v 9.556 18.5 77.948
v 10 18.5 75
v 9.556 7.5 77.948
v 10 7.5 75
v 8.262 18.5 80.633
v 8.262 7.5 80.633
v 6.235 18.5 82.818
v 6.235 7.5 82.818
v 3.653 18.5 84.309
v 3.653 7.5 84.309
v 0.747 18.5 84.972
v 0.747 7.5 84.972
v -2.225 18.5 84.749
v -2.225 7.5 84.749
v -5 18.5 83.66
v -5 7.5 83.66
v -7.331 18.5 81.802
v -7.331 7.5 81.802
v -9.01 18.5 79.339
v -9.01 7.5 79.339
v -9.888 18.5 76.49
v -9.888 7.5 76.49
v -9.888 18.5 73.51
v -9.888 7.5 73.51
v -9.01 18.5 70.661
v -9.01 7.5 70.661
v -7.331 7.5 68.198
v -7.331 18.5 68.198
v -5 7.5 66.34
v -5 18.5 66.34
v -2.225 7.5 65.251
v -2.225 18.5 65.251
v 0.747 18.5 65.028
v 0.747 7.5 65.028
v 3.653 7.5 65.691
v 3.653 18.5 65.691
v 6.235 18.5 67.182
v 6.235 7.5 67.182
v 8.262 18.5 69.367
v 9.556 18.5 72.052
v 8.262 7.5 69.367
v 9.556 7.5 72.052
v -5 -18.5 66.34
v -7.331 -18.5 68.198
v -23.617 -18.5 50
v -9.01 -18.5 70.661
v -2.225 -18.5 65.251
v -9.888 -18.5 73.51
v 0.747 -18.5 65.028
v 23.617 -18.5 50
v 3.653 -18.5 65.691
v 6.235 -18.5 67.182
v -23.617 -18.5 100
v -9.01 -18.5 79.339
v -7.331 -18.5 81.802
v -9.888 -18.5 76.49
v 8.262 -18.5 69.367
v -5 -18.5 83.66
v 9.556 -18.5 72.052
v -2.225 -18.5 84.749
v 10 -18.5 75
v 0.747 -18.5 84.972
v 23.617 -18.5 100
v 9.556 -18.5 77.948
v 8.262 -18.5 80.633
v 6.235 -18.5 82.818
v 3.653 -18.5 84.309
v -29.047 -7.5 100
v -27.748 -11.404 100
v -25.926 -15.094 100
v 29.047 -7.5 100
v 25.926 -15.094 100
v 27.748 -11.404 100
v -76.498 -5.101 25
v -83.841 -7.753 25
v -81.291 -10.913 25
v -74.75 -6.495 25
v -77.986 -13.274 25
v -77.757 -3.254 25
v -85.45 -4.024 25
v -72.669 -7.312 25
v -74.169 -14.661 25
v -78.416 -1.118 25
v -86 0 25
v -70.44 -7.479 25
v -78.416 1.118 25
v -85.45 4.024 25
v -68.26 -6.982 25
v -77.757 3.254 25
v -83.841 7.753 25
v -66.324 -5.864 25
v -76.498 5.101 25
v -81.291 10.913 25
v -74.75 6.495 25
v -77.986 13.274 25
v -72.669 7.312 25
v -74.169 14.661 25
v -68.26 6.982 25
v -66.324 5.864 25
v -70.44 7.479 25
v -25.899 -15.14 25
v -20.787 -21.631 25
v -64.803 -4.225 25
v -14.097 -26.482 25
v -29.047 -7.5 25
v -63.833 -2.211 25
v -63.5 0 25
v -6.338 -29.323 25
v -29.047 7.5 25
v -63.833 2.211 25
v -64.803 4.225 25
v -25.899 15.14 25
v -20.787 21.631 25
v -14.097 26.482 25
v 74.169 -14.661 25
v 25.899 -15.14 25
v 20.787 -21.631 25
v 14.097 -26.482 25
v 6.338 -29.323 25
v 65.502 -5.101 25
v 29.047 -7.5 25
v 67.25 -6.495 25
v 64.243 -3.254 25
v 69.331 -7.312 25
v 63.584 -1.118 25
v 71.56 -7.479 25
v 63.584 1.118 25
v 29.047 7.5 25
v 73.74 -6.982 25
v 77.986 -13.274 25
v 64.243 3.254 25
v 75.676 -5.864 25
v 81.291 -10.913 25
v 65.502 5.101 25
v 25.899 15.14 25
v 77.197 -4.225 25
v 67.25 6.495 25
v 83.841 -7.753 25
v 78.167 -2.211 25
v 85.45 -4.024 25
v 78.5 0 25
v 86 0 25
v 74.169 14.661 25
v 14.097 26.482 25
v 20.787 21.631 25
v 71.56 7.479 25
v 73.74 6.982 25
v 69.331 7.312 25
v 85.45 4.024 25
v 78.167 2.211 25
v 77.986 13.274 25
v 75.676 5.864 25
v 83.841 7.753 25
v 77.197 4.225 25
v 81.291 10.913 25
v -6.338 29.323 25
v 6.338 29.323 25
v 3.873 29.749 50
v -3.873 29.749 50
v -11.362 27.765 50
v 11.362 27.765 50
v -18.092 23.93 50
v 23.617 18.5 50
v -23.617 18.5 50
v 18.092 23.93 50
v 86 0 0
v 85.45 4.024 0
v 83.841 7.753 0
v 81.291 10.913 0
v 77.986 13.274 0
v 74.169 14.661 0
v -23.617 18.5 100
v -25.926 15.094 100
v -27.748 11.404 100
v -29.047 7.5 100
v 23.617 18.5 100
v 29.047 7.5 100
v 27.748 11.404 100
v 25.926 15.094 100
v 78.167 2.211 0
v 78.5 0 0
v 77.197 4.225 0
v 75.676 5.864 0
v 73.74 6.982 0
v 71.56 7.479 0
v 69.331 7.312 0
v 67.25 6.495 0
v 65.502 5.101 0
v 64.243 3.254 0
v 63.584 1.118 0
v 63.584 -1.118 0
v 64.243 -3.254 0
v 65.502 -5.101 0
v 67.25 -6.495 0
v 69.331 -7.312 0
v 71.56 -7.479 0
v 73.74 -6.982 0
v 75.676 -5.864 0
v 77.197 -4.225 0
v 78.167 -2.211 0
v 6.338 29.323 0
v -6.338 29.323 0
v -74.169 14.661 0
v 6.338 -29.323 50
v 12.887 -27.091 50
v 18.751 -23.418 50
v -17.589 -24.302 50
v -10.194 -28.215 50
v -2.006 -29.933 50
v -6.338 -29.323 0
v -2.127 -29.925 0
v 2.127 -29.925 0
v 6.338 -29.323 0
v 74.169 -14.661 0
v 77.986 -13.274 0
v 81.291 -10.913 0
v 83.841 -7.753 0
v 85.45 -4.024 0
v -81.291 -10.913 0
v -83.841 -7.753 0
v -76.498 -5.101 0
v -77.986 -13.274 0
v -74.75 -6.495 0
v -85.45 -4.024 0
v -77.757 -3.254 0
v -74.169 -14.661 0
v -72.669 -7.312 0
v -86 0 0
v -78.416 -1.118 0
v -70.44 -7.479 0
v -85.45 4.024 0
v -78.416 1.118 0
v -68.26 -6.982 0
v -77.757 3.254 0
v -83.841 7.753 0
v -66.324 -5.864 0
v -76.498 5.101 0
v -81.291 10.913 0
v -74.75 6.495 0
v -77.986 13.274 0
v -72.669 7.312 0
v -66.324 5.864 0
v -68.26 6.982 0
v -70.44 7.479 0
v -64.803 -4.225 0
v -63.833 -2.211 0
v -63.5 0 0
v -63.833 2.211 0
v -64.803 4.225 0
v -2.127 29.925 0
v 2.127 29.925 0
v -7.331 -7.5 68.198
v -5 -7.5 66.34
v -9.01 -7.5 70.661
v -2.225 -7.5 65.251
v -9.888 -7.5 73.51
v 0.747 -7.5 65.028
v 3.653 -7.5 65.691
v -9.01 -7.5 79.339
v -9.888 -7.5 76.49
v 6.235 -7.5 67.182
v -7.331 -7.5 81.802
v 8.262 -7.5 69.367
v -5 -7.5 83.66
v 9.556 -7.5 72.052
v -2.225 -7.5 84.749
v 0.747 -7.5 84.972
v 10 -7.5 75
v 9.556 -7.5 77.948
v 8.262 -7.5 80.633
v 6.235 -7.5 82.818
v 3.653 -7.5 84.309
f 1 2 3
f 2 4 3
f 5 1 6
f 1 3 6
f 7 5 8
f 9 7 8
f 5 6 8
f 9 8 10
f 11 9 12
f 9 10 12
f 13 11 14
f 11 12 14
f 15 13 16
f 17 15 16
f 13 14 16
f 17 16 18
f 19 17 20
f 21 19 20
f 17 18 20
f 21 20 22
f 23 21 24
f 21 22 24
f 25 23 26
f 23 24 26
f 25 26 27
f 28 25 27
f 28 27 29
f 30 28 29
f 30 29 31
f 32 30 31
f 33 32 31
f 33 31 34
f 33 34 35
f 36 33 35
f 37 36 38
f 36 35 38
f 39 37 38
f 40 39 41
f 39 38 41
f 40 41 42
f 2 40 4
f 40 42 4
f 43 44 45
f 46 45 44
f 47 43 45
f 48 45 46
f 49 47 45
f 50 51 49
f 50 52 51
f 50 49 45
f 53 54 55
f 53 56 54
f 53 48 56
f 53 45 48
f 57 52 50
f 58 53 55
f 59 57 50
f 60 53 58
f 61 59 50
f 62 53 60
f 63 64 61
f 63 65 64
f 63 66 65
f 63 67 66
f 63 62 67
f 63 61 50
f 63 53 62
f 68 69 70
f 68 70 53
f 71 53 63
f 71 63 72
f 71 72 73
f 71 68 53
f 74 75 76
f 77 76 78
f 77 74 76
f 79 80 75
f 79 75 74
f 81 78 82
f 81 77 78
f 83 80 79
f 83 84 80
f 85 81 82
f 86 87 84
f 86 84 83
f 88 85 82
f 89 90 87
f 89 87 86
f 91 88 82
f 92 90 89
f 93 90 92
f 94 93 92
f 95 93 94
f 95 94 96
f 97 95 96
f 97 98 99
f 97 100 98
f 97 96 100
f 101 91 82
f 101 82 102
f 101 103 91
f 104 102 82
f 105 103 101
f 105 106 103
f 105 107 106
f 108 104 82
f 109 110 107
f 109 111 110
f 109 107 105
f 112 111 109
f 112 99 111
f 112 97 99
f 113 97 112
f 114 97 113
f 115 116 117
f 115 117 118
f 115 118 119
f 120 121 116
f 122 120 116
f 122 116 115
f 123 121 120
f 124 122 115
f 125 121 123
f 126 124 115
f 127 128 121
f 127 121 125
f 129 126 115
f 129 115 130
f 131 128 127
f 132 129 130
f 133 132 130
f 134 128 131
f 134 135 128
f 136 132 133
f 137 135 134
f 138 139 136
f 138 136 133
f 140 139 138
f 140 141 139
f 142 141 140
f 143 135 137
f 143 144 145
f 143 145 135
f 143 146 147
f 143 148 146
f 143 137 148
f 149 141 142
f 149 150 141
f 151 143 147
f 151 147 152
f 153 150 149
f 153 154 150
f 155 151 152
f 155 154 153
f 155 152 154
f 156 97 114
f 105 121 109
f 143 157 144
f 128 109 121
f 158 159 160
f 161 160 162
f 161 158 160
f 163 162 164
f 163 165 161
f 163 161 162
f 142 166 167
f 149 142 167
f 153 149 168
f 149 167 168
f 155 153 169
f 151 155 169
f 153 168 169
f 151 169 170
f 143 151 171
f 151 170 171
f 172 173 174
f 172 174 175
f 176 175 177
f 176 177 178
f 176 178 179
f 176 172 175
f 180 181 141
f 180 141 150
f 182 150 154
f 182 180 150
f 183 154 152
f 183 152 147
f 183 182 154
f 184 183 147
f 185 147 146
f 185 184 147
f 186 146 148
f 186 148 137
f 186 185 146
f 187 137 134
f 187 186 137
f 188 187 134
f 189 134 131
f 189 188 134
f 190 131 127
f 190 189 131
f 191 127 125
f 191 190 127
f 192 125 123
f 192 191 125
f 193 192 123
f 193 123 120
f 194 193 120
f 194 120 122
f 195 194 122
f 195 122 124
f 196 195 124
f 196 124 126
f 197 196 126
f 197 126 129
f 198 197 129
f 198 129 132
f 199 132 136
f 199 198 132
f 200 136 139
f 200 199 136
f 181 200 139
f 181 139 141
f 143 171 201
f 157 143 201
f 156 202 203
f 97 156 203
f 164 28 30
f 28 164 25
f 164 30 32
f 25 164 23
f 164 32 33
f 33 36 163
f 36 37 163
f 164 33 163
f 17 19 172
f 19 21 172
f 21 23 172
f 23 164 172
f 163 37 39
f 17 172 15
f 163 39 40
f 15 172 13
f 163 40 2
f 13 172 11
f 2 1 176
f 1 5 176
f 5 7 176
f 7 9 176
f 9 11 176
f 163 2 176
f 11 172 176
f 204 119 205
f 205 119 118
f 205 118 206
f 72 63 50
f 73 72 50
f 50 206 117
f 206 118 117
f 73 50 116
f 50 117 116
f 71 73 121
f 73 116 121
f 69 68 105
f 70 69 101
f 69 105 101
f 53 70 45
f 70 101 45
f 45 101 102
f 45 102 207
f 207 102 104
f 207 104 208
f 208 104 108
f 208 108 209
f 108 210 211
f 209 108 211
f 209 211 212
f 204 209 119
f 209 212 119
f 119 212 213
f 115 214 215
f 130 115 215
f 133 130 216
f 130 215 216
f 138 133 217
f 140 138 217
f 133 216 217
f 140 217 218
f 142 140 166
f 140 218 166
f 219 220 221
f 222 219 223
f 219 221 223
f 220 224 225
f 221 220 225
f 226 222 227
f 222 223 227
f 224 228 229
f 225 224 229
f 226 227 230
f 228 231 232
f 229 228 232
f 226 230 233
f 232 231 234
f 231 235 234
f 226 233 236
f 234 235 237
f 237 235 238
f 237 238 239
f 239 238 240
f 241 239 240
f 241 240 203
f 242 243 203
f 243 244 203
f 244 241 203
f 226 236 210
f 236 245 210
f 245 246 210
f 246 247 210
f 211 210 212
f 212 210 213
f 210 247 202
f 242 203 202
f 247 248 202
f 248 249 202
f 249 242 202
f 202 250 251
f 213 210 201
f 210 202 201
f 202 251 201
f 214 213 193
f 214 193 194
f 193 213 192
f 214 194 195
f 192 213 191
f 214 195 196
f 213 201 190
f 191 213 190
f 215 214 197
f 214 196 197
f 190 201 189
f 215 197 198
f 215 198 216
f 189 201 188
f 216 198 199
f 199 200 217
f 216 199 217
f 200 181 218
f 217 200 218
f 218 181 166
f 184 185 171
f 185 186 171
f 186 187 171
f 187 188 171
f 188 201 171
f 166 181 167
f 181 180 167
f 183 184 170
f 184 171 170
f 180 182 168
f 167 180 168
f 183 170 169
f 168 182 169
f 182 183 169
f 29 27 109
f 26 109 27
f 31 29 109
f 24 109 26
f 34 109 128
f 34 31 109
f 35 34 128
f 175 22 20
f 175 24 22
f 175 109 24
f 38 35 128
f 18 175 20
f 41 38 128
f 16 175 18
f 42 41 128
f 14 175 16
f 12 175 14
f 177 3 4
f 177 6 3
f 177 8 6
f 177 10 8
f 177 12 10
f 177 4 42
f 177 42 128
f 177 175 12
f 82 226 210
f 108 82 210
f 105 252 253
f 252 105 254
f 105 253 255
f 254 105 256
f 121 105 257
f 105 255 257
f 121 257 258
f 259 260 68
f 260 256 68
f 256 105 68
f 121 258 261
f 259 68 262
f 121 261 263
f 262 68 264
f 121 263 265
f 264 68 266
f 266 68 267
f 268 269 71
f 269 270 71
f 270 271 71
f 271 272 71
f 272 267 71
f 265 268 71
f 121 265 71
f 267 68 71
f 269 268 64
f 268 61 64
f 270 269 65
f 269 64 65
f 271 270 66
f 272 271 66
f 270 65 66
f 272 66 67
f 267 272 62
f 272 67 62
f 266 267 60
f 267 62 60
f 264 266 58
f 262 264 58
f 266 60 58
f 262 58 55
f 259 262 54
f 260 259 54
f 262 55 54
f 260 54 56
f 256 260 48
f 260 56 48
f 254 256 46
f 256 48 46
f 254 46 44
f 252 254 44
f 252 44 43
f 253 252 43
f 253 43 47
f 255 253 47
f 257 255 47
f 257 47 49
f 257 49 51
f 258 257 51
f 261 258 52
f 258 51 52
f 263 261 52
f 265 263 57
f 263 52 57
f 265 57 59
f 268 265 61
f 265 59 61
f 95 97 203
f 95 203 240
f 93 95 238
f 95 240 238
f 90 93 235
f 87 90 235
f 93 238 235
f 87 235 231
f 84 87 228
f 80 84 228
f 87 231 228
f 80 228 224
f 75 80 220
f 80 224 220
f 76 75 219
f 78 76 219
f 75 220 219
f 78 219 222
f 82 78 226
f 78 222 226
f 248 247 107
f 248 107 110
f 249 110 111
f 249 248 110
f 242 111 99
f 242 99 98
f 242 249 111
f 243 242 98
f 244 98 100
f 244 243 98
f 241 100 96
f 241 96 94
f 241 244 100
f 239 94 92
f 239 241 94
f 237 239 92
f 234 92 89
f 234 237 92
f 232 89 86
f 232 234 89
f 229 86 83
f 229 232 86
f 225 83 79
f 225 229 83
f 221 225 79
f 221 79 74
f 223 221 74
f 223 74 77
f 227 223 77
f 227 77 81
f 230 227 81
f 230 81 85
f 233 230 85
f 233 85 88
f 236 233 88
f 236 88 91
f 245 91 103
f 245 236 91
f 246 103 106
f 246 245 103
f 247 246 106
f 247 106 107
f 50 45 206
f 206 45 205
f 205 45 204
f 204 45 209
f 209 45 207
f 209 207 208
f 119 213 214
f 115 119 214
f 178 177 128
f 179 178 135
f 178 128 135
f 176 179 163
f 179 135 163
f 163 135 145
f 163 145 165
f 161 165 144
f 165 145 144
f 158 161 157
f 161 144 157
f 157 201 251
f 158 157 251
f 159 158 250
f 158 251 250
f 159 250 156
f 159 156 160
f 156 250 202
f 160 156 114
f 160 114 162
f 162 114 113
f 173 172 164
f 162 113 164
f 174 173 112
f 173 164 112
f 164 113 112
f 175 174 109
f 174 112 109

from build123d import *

# Parameters (mm, degrees)
F0_R     = 7.5
F1_DEPTH = 25
F2_DEPTH = 100
F3_W     = 80
F3_H     = 15
F4_DEPTH = 75
F5_W     = 130
F5_H     = 70
F5_W_2   = 100
F5_H_2   = 37
F6_DEPTH = 50
F7_R     = 10
F8_DEPTH = 25


with BuildPart() as f1:
    # F0 (on Top) → F1 (new body)
    with BuildSketch(Plane.XY):
        with BuildLine():
            ThreePointArc((-74.1690140845, -14.6614238644), (-61.5802126157, -11.6733716481), (-56, 0))
            ThreePointArc((-56, 0), (-61.5802126157, 11.6733716481), (-74.1690140845, 14.6614238644))
            ThreePointArc((-74.1690140845, 14.6614238644), (-86, 0), (-74.1690140845, -14.6614238644))
        make_face()
        with Locations((-71, 0)):
            Circle(F0_R, mode=Mode.SUBTRACT)
        with BuildLine():
            ThreePointArc((-74.1690140845, 14.6614238644), (-61.5802126157, 11.6733716481), (-56, 0))
            ThreePointArc((-56, 0), (-61.5802126157, -11.6733716481), (-74.1690140845, -14.6614238644))
            Line((-74.1690140845, -14.6614238644), (-6.338028169, -29.3228477288))
            ThreePointArc((-6.338028169, -29.3228477288), (-30, 0), (-6.338028169, 29.3228477288))
            Line((-6.338028169, 29.3228477288), (-74.1690140845, 14.6614238644))
        make_face()
        with BuildLine():
            ThreePointArc((6.338028169, 29.3228477288), (0, 30), (-6.338028169, 29.3228477288))
            ThreePointArc((-6.338028169, 29.3228477288), (-30, 0), (-6.338028169, -29.3228477288))
            ThreePointArc((-6.338028169, -29.3228477288), (0, -30), (6.338028169, -29.3228477288))
            ThreePointArc((6.338028169, -29.3228477288), (23.3467432961, -18.8395747687), (30, 0))
            ThreePointArc((30, 0), (23.3467432961, 18.8395747687), (6.338028169, 29.3228477288))
        make_face()
        with BuildLine():
            Line((74.1690140845, 14.6614238644), (6.338028169, 29.3228477288))
            ThreePointArc((6.338028169, 29.3228477288), (23.3467432961, 18.8395747687), (30, 0))
            ThreePointArc((30, 0), (23.3467432961, -18.8395747687), (6.338028169, -29.3228477288))
            Line((6.338028169, -29.3228477288), (74.1690140845, -14.6614238644))
            ThreePointArc((74.1690140845, -14.6614238644), (56, 0), (74.1690140845, 14.6614238644))
        make_face()
        with BuildLine():
            ThreePointArc((86, 0), (82.6733716481, 9.4197873843), (74.1690140845, 14.6614238644))
            ThreePointArc((74.1690140845, 14.6614238644), (56, 0), (74.1690140845, -14.6614238644))
            ThreePointArc((74.1690140845, -14.6614238644), (82.6733716481, -9.4197873843), (86, 0))
        make_face()
        with Locations((71, 0)):
            Circle(F0_R, mode=Mode.SUBTRACT)
    extrude(amount=F1_DEPTH)

    # F0 (on Top) → F2 (join)
    with BuildSketch(Plane.XY):
        with BuildLine():
            ThreePointArc((6.338028169, 29.3228477288), (0, 30), (-6.338028169, 29.3228477288))
            ThreePointArc((-6.338028169, 29.3228477288), (-30, 0), (-6.338028169, -29.3228477288))
            ThreePointArc((-6.338028169, -29.3228477288), (0, -30), (6.338028169, -29.3228477288))
            ThreePointArc((6.338028169, -29.3228477288), (23.3467432961, -18.8395747687), (30, 0))
            ThreePointArc((30, 0), (23.3467432961, 18.8395747687), (6.338028169, 29.3228477288))
        make_face()
    extrude(amount=F2_DEPTH)

    # F3 (on face) → F4 (cut, through all)
    with BuildSketch(Plane.XY.offset(100)):
        Rectangle(F3_W, F3_H)
    extrude(amount=-F4_DEPTH, mode=Mode.SUBTRACT)

    # F5 (on face) → F6 (cut)
    with BuildSketch(Plane.XY.offset(100)):
        Rectangle(F5_W, F5_H)
        Rectangle(F5_W_2, F5_H_2, mode=Mode.SUBTRACT)
    extrude(amount=-F6_DEPTH, mode=Mode.SUBTRACT)

    # F7 (on Front) → F8 (cut, symmetric)
    with BuildSketch(Plane.XZ):
        with Locations((0, 75)):
            Circle(F7_R)
    extrude(amount=F8_DEPTH, both=True, mode=Mode.SUBTRACT)


solid = f1.part
